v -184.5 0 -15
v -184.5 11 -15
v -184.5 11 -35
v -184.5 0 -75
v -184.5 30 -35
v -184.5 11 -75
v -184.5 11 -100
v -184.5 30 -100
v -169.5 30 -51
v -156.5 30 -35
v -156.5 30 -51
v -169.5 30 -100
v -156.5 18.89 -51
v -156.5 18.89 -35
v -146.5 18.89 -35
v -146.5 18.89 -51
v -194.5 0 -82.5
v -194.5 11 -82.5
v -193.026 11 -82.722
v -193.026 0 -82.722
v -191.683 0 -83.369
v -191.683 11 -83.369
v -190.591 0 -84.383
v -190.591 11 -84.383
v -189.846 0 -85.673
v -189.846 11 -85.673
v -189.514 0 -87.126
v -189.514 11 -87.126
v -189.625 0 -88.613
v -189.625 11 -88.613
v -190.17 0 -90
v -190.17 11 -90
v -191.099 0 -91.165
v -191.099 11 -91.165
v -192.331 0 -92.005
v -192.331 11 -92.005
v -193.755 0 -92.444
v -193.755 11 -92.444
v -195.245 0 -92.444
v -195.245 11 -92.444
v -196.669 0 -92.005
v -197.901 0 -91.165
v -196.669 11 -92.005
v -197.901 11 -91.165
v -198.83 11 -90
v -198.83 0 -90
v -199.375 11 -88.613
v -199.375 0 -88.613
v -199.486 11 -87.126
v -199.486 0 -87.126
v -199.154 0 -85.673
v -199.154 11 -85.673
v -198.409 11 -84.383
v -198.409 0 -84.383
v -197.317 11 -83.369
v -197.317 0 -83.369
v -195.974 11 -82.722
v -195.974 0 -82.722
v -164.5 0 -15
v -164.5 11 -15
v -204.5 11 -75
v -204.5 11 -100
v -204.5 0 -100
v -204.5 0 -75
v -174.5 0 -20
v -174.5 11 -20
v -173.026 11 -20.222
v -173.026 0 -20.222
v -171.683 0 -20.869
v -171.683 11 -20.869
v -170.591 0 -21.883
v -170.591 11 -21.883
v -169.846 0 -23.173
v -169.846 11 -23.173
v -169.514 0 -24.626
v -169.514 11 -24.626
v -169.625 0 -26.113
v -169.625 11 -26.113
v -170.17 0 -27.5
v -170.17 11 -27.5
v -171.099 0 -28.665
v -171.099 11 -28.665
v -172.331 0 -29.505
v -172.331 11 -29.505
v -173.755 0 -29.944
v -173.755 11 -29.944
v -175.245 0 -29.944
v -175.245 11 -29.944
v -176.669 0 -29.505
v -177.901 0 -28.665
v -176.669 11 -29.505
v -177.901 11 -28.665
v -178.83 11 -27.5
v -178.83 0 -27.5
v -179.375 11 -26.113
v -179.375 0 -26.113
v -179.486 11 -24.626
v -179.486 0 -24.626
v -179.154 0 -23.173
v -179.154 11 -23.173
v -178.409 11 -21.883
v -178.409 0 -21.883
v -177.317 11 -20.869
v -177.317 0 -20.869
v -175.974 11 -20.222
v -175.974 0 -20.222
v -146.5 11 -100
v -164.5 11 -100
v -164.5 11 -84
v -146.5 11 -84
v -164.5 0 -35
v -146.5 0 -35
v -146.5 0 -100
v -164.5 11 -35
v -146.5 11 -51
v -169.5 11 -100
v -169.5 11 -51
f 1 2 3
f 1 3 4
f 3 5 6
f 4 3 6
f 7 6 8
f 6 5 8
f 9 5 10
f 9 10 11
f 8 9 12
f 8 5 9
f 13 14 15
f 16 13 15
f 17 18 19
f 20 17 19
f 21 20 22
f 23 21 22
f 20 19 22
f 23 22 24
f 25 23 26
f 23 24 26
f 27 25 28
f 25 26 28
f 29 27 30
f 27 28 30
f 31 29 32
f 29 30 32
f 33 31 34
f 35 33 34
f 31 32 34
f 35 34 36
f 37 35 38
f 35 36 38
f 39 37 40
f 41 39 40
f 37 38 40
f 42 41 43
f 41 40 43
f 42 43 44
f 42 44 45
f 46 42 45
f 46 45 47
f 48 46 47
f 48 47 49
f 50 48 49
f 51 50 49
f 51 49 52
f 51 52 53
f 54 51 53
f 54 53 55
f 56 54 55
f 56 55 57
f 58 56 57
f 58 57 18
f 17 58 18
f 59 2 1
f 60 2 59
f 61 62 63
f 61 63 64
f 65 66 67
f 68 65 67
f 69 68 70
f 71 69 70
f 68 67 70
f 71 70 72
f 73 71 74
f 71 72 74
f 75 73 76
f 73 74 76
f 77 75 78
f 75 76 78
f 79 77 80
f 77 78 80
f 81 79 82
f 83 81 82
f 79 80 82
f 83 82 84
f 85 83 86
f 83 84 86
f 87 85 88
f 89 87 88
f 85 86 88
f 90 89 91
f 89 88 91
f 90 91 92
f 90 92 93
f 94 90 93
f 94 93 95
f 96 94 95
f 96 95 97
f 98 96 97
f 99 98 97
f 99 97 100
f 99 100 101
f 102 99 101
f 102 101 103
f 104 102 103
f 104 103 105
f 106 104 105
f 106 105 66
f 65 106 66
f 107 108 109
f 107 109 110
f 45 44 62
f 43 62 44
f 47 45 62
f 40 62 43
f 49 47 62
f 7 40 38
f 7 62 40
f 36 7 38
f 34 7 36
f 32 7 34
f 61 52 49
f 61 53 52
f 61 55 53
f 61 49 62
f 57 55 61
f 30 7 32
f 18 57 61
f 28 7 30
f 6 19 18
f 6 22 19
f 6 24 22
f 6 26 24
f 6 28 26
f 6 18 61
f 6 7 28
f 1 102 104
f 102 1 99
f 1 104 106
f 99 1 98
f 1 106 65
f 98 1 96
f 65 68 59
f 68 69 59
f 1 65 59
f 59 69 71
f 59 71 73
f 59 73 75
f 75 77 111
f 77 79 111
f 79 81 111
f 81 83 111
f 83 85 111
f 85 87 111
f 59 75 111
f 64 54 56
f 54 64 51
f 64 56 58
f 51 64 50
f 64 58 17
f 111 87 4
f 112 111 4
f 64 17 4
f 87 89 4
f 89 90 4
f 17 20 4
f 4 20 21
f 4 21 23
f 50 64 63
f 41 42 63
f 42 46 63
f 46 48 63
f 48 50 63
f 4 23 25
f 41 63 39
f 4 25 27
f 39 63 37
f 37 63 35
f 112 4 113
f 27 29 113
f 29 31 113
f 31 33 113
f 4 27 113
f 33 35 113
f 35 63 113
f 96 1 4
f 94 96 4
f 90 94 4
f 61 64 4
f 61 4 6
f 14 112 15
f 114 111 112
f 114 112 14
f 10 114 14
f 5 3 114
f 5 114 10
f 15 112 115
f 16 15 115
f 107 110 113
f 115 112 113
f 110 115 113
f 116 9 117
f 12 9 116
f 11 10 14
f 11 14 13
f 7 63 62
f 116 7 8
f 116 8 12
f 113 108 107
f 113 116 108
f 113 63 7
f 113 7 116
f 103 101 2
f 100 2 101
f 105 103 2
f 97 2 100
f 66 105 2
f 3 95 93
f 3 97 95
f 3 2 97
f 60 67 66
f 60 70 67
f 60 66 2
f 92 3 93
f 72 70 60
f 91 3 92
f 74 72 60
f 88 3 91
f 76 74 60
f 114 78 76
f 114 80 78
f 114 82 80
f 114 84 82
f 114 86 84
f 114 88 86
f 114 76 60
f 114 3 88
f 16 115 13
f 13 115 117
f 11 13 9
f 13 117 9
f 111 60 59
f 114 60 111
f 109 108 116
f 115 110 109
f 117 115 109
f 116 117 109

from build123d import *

# Parameters (mm, degrees)
SKETCH1_W                   = 369
SKETCH1_H                   = 200
BOSS_EXTRUDE1_DEPTH         = 20
SKETCH2_W                   = 129
SKETCH2_H                   = 16
BOSS_EXTRUDE2_DEPTH         = 10
SKETCH3_W                   = 342
SKETCH3_H                   = 168
CUT_EXTRUDE1_DEPTH          = 9
SKETCH4_W                   = 100
SKETCH4_H                   = 10
BOSS_EXTRUDE3_DEPTH         = 60
CUT_EXTRUDE3_DEPTH          = 10
CUT_EXTRUDE3_DEPTH_BACK     = 60
SKETCH10_W                  = 404
SKETCH10_H                  = 324.796202869
CUT_EXTRUDE4_DEPTH          = 69
CUT_EXTRUDE7_DEPTH          = 274.752168941
CUT_EXTRUDE7_DEPTH_BACK     = 274.752168941
SKETCH14_W                  = 37
SKETCH14_H                  = 34.717467541
SKETCH12_W                  = 50
SKETCH12_H                  = 11
BOSS_EXTRUDE6_DEPTH         = 20
SKETCH13_R                  = 4
CUT_EXTRUDE6_DEPTH          = 229.43215623
CORTAR_EXTRUIR4_DEPTH       = 220
CROQUIS5_W                  = 20
CROQUIS5_H                  = 11
SALIENTE_EXTRUIR2_DEPTH     = 10
CROQUIS6_W                  = 20
CROQUIS6_H                  = 11
SALIENTE_EXTRUIR3_DEPTH     = 20
CROQUIS8_R                  = 5
CORTAR_EXTRUIR5_DEPTH       = 48
CROQUIS9_W                  = 38
CROQUIS9_H                  = 65
CORTAR_EXTRUIR6_DEPTH       = 85
CROQUIS10_W                 = 10
CROQUIS10_H                 = 16
SALIENTE_EXTRUIR4_DEPTH     = 7.89
CROQUIS11_W                 = 16
CROQUIS11_H                 = 19
SALIENTE_EXTRUIR5_DEPTH     = 13
CORTAR_EXTRUIR10_DEPTH      = 36.9
CORTAR_EXTRUIR10_DEPTH_BACK = 7.894953
CROQUIS12_W                 = 18
CROQUIS12_H                 = 16
CROQUIS13_W                 = 5
CROQUIS13_H                 = 16
CORTAR_EXTRUIR11_DEPTH      = 19
CROQUIS14_W                 = 25
CROQUIS14_H                 = 11
SALIENTE_EXTRUIR6_DEPTH     = 20
CROQUIS15_W                 = 20
CROQUIS15_H                 = 25
CORTAR_EXTRUIR12_DEPTH      = 238.868135739
CROQUIS16_R                 = 5
CORTAR_EXTRUIR13_DEPTH      = 238.868135739
CROQUIS17_W                 = 20
CROQUIS17_H                 = 20
SALIENTE_EXTRUIR7_DEPTH     = 11
CROQUIS18_W                 = 20
CROQUIS18_H                 = 20
CORTAR_EXTRUIR14_DEPTH      = 238.868135739
CROQUIS19_R                 = 5
CORTAR_EXTRUIR15_DEPTH      = 229.43215623


with BuildPart() as part:
    # Sketch1 → Boss-Extrude1 (new body)
    with BuildSketch(Plane(origin=(0, 0, 0), x_dir=(1, 0, 0), z_dir=(0, 1, 0))):
        Rectangle(SKETCH1_W, SKETCH1_H)
    extrude(amount=BOSS_EXTRUDE1_DEPTH)

    # Sketch2 → Boss-Extrude2 (add)
    with BuildSketch(Plane(origin=(0, 20, 0), x_dir=(1, 0, 0), z_dir=(0, 1, 0))):
        Polygon((-184.5, -100), (-169.5, -100), (-119.5, -100), (-119.5, -84), (-169.5, -84), (-169.5, -35), (-184.5, -35), align=None)
        Polygon((-184.5, 100), (-169.5, 100), (-119.5, 100), (-119.5, 84), (-169.5, 84), (-169.5, 35), (-184.5, 35), align=None)
        with Locations((20, -92)):
            Rectangle(SKETCH2_W, SKETCH2_H)
        with Locations((20, 92)):
            Rectangle(SKETCH2_W, SKETCH2_H)
    extrude(amount=BOSS_EXTRUDE2_DEPTH)

    # Sketch3 → Cut-Extrude1 (cut)
    with BuildSketch(Plane(origin=(0, 20, 0), x_dir=(1, 0, 0), z_dir=(0, 1, 0))):
        with Locations((1.5, 0)):
            Rectangle(SKETCH3_W, SKETCH3_H)
    extrude(amount=-CUT_EXTRUDE1_DEPTH, mode=Mode.SUBTRACT)

    # Sketch4 → Boss-Extrude3 (add)
    with BuildSketch(Plane(origin=(0, 0, -100), x_dir=(-1, 0, 0), z_dir=(0, 0, -1))):
        with Locations((-19.5, 25)):
            Rectangle(SKETCH4_W, SKETCH4_H)
    extrude(amount=BOSS_EXTRUDE3_DEPTH)

    # Sketch6 → Cut-Extrude3 (cut, two sides: drawn at the far end of the back side and taken through both)
    with BuildSketch(Plane.XY.offset(-84).offset(-CUT_EXTRUDE3_DEPTH_BACK)):
        with BuildLine():
            Line((-24.5, 30), (-26.030765637, 28.081051534))
            ThreePointArc((-26.030765637, 28.081051534), (-26.158442873, 26.948989892), (-25.193843525, 26.342843758))
            Line((-25.193843525, 26.342843758), (-15.806155854, 26.342843758))
            ThreePointArc((-15.806155854, 26.342843758), (-14.841556992, 26.948990172), (-14.969234363, 28.081051534))
            Line((-14.969234363, 28.081051534), (-16.5, 30))
            Line((-16.5, 30), (-24.5, 30))
        make_face()
        with BuildLine():
            Line((56.5, 30), (54.981983491, 27.801494438))
            ThreePointArc((54.981983491, 27.801494438), (54.9192914, 26.767046688), (55.80615587, 26.230871478))
            Line((55.80615587, 26.230871478), (65.193843541, 26.230871478))
            ThreePointArc((65.193843541, 26.230871478), (66.080708464, 26.767046428), (66.018016509, 27.801494438))
            Line((66.018016509, 27.801494438), (64.5, 30))
            Line((64.5, 30), (56.5, 30))
        make_face()
    extrude(amount=CUT_EXTRUDE3_DEPTH + CUT_EXTRUDE3_DEPTH_BACK, mode=Mode.SUBTRACT)

    # Sketch10 → Cut-Extrude4 (cut)
    with BuildSketch(Plane(origin=(0, 30, 0), x_dir=(1, 0, 0), z_dir=(0, 1, 0))):
        with Locations((55.5, -0.89352463)):
            Rectangle(SKETCH10_W, SKETCH10_H)
    extrude(amount=-CUT_EXTRUDE4_DEPTH, mode=Mode.SUBTRACT)

    # Sketch14 → Cut-Extrude7 (cut, two sides: drawn at the far end of the back side and taken through both)
    with BuildSketch(Plane(origin=(0, 0, -100), x_dir=(-1, 0, 0), z_dir=(0, 0, -1)).offset(-CUT_EXTRUDE7_DEPTH_BACK)):
        with Locations((138, 36.253686327)):
            Rectangle(SKETCH14_W, SKETCH14_H)
    extrude(amount=CUT_EXTRUDE7_DEPTH + CUT_EXTRUDE7_DEPTH_BACK, mode=Mode.SUBTRACT)

    # Sketch12 → Boss-Extrude6 (add)
    with BuildSketch(Plane.ZY.offset(184.5)):
        with Locations((-25, 5.5)):
            Rectangle(SKETCH12_W, SKETCH12_H)
    extrude(amount=BOSS_EXTRUDE6_DEPTH)

    # Sketch13 → Cut-Extrude6 (cut, through all)
    with BuildSketch(Plane(origin=(0, 11, 0), x_dir=(1, 0, 0), z_dir=(0, 1, 0))):
        with Locations(Location((-194.5, 25, 0), (0, 0, 270))):
            Circle(SKETCH13_R)
    extrude(amount=-CUT_EXTRUDE6_DEPTH, mode=Mode.SUBTRACT)

    # Croquis3 → Cortar-Extruir4 (cut)
    with BuildSketch(Plane(origin=(0, 30, 0), x_dir=(1, 0, 0), z_dir=(0, 1, 0))):
        Polygon((-169.5, -35), (-146.5, -35), (-146.5, 0), (-146.5, 35), (-204.5, 35), (-204.5, 0), (-204.5, -35), (-184.5, -35), align=None)
    extrude(amount=-CORTAR_EXTRUIR4_DEPTH, mode=Mode.SUBTRACT)


with BuildPart() as cortar_extruir4_piece_1:
    # of the separate pieces the step leaves, piece 1, a body of its own (cortar_extruir4_pieces)
    add(part.part.solids().sort_by_distance((-184.5, 30, -100))[0])

    # Croquis5 → Saliente-Extruir2 (add)
    with BuildSketch(Plane(origin=(0, 0, -50), x_dir=(-1, 0, 0), z_dir=(0, 0, -1))):
        with Locations((194.5, 5.5)):
            Rectangle(CROQUIS5_W, CROQUIS5_H)
    extrude(amount=SALIENTE_EXTRUIR2_DEPTH)

    # Croquis6 → Saliente-Extruir3 (add)
    with BuildSketch(Plane(origin=(0, 0, -100), x_dir=(-1, 0, 0), z_dir=(0, 0, -1))):
        with Locations((174.5, 5.5)):
            Rectangle(CROQUIS6_W, CROQUIS6_H)
    extrude(amount=SALIENTE_EXTRUIR3_DEPTH)

    # Croquis8 → Cortar-Extruir5 (cut)
    with BuildSketch(Plane(origin=(0, 11, 0), x_dir=(1, 0, 0), z_dir=(0, 1, 0))):
        with Locations(Location((-194.5, 47.5, 0), (0, 0, 270))):
            Circle(CROQUIS8_R)
        with Locations((-194.5, -47.5)):
            Circle(CROQUIS8_R)
        with Locations((-174.5, -110)):
            Circle(CROQUIS8_R)
        with Locations(Location((-174.5, 110, 0), (0, 0, 270))):
            Circle(CROQUIS8_R)
    extrude(amount=-CORTAR_EXTRUIR5_DEPTH, mode=Mode.SUBTRACT)

    # Croquis10 → Saliente-Extruir4 (add)
    with BuildSketch(Plane(origin=(0, 11, 0), x_dir=(1, 0, 0), z_dir=(0, 1, 0))):
        with Locations((-151.5, 43)):
            Rectangle(CROQUIS10_W, CROQUIS10_H)
    extrude(amount=SALIENTE_EXTRUIR4_DEPTH)

    # Croquis11 → Saliente-Extruir5 (add)
    with BuildSketch(Plane(origin=(-169.5, 0, 0), x_dir=(0, 0, -1), z_dir=(1, 0, 0))):
        with Locations((43, 20.5)):
            Rectangle(CROQUIS11_W, CROQUIS11_H)
    extrude(amount=SALIENTE_EXTRUIR5_DEPTH)

    # Croquis12 → Cortar-Extruir10 (cut, two sides: drawn at the far end of the back side and taken through both)
    with BuildSketch(Plane(origin=(0, 18.894952557, 0), x_dir=(1, 0, 0), z_dir=(0, 1, 0)).offset(-CORTAR_EXTRUIR10_DEPTH_BACK)):
        with Locations((-155.5, 92)):
            Rectangle(CROQUIS12_W, CROQUIS12_H)
    extrude(amount=CORTAR_EXTRUIR10_DEPTH + CORTAR_EXTRUIR10_DEPTH_BACK, mode=Mode.SUBTRACT)

    # Croquis13 → Cortar-Extruir11 (cut)
    with BuildSketch(Plane(origin=(0, 30, 0), x_dir=(1, 0, 0), z_dir=(0, 1, 0))):
        with Locations((-167, 92)):
            Rectangle(CROQUIS13_W, CROQUIS13_H)
    extrude(amount=-CORTAR_EXTRUIR11_DEPTH, mode=Mode.SUBTRACT)

    # Croquis14 → Saliente-Extruir6 (add)
    with BuildSketch(Plane.ZY.offset(184.5)):
        with Locations((-87.5, 5.5)):
            Rectangle(CROQUIS14_W, CROQUIS14_H)
    extrude(amount=SALIENTE_EXTRUIR6_DEPTH)

    # Croquis15 → Cortar-Extruir12 (cut, through all)
    with BuildSketch(Plane(origin=(0, 11, 0), x_dir=(1, 0, 0), z_dir=(0, 1, 0))):
        with Locations((-194.5, 47.5)):
            Rectangle(CROQUIS15_W, CROQUIS15_H)
    extrude(amount=-CORTAR_EXTRUIR12_DEPTH, mode=Mode.SUBTRACT)

    # Croquis16 → Cortar-Extruir13 (cut, through all)
    with BuildSketch(Plane(origin=(0, 11, 0), x_dir=(1, 0, 0), z_dir=(0, 1, 0))):
        with Locations(Location((-194.5, 87.5, 0), (0, 0, 270))):
            Circle(CROQUIS16_R)
    extrude(amount=-CORTAR_EXTRUIR13_DEPTH, mode=Mode.SUBTRACT)

    # Croquis17 → Saliente-Extruir7 (add)
    with BuildSketch(Plane(origin=(0, 11, 0), x_dir=(1, 0, 0), z_dir=(0, 1, 0))):
        with Locations((-174.5, 25)):
            Rectangle(CROQUIS17_W, CROQUIS17_H)
    extrude(amount=-SALIENTE_EXTRUIR7_DEPTH)

    # Croquis18 → Cortar-Extruir14 (cut, through all)
    with BuildSketch(Plane(origin=(0, 11, 0), x_dir=(1, 0, 0), z_dir=(0, 1, 0))):
        with Locations((-174.5, 110)):
            Rectangle(CROQUIS18_W, CROQUIS18_H)
    extrude(amount=-CORTAR_EXTRUIR14_DEPTH, mode=Mode.SUBTRACT)

    # Croquis19 → Cortar-Extruir15 (cut, through all)
    with BuildSketch(Plane(origin=(0, 11, 0), x_dir=(1, 0, 0), z_dir=(0, 1, 0))):
        with Locations(Location((-174.5, 25, 0), (0, 0, 270))):
            Circle(CROQUIS19_R)
    extrude(amount=-CORTAR_EXTRUIR15_DEPTH, mode=Mode.SUBTRACT)


with BuildPart() as cortar_extruir4_piece_2:
    # of the separate pieces the step leaves, piece 2, a body of its own (cortar_extruir4_pieces)
    add(part.part.solids().sort_by_distance((-184.5, 30, 100))[0])

    # Croquis9 → Cortar-Extruir6 (cut)
    with BuildSketch(Plane(origin=(0, 30, 0), x_dir=(1, 0, 0), z_dir=(0, 1, 0))):
        with Locations((-165.5, -67.5)):
            Rectangle(CROQUIS9_W, CROQUIS9_H)
    extrude(amount=-CORTAR_EXTRUIR6_DEPTH, mode=Mode.SUBTRACT)


solid = cortar_extruir4_piece_1.part
